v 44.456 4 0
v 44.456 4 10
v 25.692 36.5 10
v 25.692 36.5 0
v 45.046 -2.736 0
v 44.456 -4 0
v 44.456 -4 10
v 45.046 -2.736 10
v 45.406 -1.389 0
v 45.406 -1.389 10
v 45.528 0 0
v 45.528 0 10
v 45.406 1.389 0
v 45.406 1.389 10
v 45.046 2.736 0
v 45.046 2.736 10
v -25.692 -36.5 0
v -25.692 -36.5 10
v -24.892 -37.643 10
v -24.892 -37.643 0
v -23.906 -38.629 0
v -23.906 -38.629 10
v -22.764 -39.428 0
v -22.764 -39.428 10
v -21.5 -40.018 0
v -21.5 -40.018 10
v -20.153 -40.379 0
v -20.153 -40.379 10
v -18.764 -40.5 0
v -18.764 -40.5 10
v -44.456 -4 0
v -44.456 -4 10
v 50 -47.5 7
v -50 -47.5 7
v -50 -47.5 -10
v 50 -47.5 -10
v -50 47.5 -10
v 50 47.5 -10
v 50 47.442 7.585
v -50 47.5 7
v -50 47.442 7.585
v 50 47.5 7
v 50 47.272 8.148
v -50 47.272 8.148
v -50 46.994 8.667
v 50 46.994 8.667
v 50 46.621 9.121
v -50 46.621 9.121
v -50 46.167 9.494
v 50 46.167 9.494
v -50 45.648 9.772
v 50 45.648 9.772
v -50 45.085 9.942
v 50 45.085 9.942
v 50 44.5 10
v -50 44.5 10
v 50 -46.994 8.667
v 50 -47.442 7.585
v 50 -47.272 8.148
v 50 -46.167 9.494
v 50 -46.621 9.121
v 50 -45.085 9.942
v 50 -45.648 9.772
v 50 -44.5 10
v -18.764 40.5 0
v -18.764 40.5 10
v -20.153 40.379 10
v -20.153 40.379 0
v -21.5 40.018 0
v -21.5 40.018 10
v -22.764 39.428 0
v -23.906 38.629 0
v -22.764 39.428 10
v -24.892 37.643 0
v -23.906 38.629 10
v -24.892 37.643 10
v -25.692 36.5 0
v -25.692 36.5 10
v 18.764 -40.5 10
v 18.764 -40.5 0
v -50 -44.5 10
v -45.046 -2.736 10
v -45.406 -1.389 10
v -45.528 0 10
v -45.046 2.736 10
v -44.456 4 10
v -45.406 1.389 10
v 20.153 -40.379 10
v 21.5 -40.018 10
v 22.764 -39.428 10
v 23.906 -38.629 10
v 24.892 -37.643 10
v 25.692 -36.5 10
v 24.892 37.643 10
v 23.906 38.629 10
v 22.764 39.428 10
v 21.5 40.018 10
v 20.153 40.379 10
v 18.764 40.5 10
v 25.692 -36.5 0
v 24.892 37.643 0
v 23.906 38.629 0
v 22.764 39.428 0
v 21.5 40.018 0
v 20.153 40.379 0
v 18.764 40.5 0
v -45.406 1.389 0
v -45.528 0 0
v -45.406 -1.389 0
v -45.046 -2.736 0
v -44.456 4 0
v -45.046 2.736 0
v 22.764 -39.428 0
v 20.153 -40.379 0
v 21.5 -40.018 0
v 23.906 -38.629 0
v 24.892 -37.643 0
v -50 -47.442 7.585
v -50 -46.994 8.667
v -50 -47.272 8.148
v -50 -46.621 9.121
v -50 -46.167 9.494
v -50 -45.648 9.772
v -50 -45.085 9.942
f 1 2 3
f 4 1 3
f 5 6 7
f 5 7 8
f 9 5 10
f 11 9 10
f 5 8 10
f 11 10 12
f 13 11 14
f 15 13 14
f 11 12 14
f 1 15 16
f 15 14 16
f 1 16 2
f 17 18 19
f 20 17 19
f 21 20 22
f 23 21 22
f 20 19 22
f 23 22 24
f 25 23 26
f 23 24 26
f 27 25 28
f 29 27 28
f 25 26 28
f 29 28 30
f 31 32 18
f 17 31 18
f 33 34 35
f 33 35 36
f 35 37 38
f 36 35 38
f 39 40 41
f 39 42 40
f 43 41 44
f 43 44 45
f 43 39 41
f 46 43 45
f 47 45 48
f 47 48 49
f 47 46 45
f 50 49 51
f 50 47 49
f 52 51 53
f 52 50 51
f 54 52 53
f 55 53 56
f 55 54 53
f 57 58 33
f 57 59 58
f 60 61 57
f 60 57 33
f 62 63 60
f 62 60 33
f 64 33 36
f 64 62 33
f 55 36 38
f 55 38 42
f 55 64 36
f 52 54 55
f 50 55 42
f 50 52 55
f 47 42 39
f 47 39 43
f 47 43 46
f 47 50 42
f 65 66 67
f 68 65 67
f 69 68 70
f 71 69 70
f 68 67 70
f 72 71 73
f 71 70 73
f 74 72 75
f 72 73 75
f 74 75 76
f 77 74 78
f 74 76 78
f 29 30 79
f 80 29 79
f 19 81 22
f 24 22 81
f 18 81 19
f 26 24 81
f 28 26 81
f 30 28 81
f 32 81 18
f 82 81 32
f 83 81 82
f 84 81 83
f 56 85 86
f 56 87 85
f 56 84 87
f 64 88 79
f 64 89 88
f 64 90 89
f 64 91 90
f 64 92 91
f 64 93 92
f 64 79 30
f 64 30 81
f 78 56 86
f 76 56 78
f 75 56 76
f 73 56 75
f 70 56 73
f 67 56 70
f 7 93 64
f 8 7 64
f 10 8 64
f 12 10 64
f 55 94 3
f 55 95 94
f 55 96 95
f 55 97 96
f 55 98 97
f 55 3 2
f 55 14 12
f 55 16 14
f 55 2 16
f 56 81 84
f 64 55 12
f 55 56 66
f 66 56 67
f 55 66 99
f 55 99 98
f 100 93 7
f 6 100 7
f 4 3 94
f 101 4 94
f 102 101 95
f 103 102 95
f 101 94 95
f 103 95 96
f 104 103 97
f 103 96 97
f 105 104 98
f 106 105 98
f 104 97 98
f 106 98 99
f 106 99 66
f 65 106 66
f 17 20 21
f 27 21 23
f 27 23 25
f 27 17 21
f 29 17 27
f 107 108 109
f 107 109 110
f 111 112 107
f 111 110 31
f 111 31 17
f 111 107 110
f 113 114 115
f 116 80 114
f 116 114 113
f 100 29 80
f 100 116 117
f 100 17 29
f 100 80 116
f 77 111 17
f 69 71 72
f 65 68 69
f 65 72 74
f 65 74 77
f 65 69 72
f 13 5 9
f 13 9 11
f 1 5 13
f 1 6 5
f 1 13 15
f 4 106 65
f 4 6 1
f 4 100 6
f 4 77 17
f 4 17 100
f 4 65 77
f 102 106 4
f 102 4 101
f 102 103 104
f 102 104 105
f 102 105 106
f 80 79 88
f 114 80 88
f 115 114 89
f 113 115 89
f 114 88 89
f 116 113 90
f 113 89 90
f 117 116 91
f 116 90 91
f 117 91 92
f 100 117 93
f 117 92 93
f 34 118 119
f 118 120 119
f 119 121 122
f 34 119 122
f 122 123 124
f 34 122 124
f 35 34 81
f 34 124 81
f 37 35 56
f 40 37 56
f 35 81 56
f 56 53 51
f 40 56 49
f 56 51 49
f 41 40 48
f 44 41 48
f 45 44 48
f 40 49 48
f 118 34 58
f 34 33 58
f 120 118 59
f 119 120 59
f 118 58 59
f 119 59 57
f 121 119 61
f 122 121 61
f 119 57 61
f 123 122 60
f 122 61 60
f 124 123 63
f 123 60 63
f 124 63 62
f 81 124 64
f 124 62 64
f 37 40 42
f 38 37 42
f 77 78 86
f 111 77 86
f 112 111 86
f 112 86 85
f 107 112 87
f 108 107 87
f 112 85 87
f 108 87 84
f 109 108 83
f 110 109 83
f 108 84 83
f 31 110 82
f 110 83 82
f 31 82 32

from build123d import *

# Parameters (mm, degrees)
F0_W     = 100
F0_H     = 95
F1_DEPTH = 10
F3_DEPTH = 10
F4_R     = 3


with BuildPart() as f1:
    # F0 (on Top) → F1 (new body, symmetric)
    with BuildSketch(Plane.XY):
        Rectangle(F0_W, F0_H)
    extrude(amount=F1_DEPTH, both=True)

    # F2 (on face) → F3 (cut)
    with BuildSketch(Plane.XY.offset(10)):
        with BuildLine():
            Line((18.764, 40.500201), (-18.764, 40.500201))
            ThreePointArc((-18.764, 40.500201), (-22.764, 39.428405), (-25.692203, 36.500201))
            Line((-25.692203, 36.500201), (-44.456203, 4))
            ThreePointArc((-44.456203, 4), (-45.528, 0), (-44.456203, -4))
            Line((-44.456203, -4), (-25.692203, -36.500201))
            ThreePointArc((-25.692203, -36.500201), (-22.764, -39.428405), (-18.764, -40.500201))
            Line((-18.764, -40.500201), (18.764, -40.500201))
            ThreePointArc((18.764, -40.500201), (22.764, -39.428405), (25.692203, -36.500201))
            Line((25.692203, -36.500201), (44.456203, -4))
            ThreePointArc((44.456203, -4), (45.528, 0), (44.456203, 4))
            Line((44.456203, 4), (25.692203, 36.500201))
            ThreePointArc((25.692203, 36.500201), (22.764, 39.428405), (18.764, 40.500201))
        make_face()
    extrude(amount=-F3_DEPTH, mode=Mode.SUBTRACT)

    # F4
    f4_edges = [f1.edges().sort_by_distance(p)[0] for p in [
        (0, -47.5, 10),
        (0, 47.5, 10),
    ]]
    fillet(f4_edges, radius=F4_R)


solid = f1.part
